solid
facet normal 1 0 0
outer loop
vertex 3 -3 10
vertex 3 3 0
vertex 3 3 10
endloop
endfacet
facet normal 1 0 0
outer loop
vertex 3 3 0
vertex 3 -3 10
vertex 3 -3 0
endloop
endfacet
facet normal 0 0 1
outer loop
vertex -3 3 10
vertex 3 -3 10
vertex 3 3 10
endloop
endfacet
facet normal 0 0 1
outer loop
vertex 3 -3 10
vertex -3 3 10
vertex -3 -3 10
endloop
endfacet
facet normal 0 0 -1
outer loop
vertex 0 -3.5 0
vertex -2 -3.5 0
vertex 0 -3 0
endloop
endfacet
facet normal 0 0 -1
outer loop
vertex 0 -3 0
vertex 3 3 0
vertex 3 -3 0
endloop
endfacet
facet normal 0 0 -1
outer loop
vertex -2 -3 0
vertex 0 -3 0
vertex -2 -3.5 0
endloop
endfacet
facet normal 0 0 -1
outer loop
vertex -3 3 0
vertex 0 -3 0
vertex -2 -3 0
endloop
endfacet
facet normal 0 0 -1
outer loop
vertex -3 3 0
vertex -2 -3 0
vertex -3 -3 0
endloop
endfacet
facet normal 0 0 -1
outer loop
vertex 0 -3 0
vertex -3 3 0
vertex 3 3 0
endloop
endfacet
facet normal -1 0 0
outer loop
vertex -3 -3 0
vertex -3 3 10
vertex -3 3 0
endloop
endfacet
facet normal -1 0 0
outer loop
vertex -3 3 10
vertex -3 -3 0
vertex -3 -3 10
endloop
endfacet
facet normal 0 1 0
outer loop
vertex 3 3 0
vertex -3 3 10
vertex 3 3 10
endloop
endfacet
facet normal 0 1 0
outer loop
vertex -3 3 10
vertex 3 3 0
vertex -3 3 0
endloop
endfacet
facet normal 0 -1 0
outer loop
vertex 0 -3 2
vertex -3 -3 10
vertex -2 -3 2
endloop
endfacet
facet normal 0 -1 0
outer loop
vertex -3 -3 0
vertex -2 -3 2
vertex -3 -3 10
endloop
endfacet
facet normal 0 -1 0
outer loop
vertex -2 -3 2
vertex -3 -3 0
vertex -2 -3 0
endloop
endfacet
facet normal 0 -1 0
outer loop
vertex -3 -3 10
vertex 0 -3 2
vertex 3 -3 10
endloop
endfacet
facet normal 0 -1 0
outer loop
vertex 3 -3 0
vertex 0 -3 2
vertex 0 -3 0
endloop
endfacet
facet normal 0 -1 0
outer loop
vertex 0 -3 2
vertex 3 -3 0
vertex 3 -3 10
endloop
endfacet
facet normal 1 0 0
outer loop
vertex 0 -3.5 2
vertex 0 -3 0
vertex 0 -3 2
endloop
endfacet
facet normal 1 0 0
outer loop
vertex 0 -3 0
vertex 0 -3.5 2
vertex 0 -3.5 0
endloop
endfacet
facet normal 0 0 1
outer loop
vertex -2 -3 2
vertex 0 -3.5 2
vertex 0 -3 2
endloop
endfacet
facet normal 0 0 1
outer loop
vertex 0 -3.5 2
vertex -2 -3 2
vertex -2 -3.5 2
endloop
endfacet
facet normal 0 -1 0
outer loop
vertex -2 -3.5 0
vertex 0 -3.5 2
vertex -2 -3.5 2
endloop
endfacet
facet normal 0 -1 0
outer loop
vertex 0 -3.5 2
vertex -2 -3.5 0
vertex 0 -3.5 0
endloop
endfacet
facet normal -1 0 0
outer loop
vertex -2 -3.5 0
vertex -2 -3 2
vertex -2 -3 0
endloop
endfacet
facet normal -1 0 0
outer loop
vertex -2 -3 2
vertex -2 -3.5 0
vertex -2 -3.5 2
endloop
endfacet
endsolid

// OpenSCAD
translate([0, 0, 5]) color([0,1,0,0.9]) cube([6, 6, 10], center=true);
translate([-0.25, -0.25, 1]) color([1,0,0]) cube([0.5, 0.5, 2], center=true);
translate([-0.75, -0.25, 1]) color([1,0,0]) cube([0.5, 0.5, 2], center=true);
translate([-1.25, -0.25, 1]) color([1,0,0]) cube([0.5, 0.5, 2], center=true);
translate([-1.75, -0.25, 1]) color([1,0,0]) cube([0.5, 0.5, 2], center=true);
translate([-2.25, -0.25, 1]) color([1,0,0]) cube([0.5, 0.5, 2], center=true);
translate([-2.75, -0.25, 1]) color([1,0,0]) cube([0.5, 0.5, 2], center=true);
translate([-0.25, -0.75, 1]) color([1,0,0]) cube([0.5, 0.5, 2], center=true);
translate([-0.75, -0.75, 1]) color([1,0,0]) cube([0.5, 0.5, 2], center=true);
translate([-1.25, -0.75, 1]) color([1,0,0]) cube([0.5, 0.5, 2], center=true);
translate([-1.75, -0.75, 1]) color([1,0,0]) cube([0.5, 0.5, 2], center=true);
translate([-2.25, -0.75, 1]) color([1,0,0]) cube([0.5, 0.5, 2], center=true);
translate([-2.75, -0.75, 1]) color([1,0,0]) cube([0.5, 0.5, 2], center=true);
translate([-0.25, -1.25, 1]) color([1,0,0]) cube([0.5, 0.5, 2], center=true);
translate([-0.75, -1.25, 1]) color([1,0,0]) cube([0.5, 0.5, 2], center=true);
translate([-1.25, -1.25, 1]) color([1,0,0]) cube([0.5, 0.5, 2], center=true);
translate([-1.75, -1.25, 1]) color([1,0,0]) cube([0.5, 0.5, 2], center=true);
translate([-2.25, -1.25, 1]) color([1,0,0]) cube([0.5, 0.5, 2], center=true);
translate([-2.75, -1.25, 1]) color([1,0,0]) cube([0.5, 0.5, 2], center=true);
translate([-0.25, -1.75, 1]) color([1,0,0]) cube([0.5, 0.5, 2], center=true);
translate([-0.75, -1.75, 1]) color([1,0,0]) cube([0.5, 0.5, 2], center=true);
translate([-1.25, -1.75, 1]) color([1,0,0]) cube([0.5, 0.5, 2], center=true);
translate([-1.75, -1.75, 1]) color([1,0,0]) cube([0.5, 0.5, 2], center=true);
translate([-2.25, -1.75, 1]) color([1,0,0]) cube([0.5, 0.5, 2], center=true);
translate([-2.75, -1.75, 1]) color([1,0,0]) cube([0.5, 0.5, 2], center=true);
translate([-0.25, -2.25, 1]) color([1,0,0]) cube([0.5, 0.5, 2], center=true);
translate([-0.75, -2.25, 1]) color([1,0,0]) cube([0.5, 0.5, 2], center=true);
translate([-1.25, -2.25, 1]) color([1,0,0]) cube([0.5, 0.5, 2], center=true);
translate([-1.75, -2.25, 1]) color([1,0,0]) cube([0.5, 0.5, 2], center=true);
translate([-2.25, -2.25, 1]) color([1,0,0]) cube([0.5, 0.5, 2], center=true);
translate([-2.75, -2.25, 1]) color([1,0,0]) cube([0.5, 0.5, 2], center=true);
translate([-0.25, -2.75, 1]) color([1,0,0]) cube([0.5, 0.5, 2], center=true);
translate([-0.75, -2.75, 1]) color([1,0,0]) cube([0.5, 0.5, 2], center=true);
translate([-1.25, -2.75, 1]) color([1,0,0]) cube([0.5, 0.5, 2], center=true);
translate([-1.75, -2.75, 1]) color([1,0,0]) cube([0.5, 0.5, 2], center=true);
translate([-2.25, -2.75, 1]) color([1,0,0]) cube([0.5, 0.5, 2], center=true);
translate([-2.75, -2.75, 1]) color([1,0,0]) cube([0.5, 0.5, 2], center=true);
translate([-0.25, -3.25, 1]) color([1,0,0]) cube([0.5, 0.5, 2], center=true);
translate([-0.75, -3.25, 1]) color([1,0,0]) cube([0.5, 0.5, 2], center=true);
translate([-1.25, -3.25, 1]) color([1,0,0]) cube([0.5, 0.5, 2], center=true);
translate([-1.75, -3.25, 1]) color([1,0,0]) cube([0.5, 0.5, 2], center=true);
